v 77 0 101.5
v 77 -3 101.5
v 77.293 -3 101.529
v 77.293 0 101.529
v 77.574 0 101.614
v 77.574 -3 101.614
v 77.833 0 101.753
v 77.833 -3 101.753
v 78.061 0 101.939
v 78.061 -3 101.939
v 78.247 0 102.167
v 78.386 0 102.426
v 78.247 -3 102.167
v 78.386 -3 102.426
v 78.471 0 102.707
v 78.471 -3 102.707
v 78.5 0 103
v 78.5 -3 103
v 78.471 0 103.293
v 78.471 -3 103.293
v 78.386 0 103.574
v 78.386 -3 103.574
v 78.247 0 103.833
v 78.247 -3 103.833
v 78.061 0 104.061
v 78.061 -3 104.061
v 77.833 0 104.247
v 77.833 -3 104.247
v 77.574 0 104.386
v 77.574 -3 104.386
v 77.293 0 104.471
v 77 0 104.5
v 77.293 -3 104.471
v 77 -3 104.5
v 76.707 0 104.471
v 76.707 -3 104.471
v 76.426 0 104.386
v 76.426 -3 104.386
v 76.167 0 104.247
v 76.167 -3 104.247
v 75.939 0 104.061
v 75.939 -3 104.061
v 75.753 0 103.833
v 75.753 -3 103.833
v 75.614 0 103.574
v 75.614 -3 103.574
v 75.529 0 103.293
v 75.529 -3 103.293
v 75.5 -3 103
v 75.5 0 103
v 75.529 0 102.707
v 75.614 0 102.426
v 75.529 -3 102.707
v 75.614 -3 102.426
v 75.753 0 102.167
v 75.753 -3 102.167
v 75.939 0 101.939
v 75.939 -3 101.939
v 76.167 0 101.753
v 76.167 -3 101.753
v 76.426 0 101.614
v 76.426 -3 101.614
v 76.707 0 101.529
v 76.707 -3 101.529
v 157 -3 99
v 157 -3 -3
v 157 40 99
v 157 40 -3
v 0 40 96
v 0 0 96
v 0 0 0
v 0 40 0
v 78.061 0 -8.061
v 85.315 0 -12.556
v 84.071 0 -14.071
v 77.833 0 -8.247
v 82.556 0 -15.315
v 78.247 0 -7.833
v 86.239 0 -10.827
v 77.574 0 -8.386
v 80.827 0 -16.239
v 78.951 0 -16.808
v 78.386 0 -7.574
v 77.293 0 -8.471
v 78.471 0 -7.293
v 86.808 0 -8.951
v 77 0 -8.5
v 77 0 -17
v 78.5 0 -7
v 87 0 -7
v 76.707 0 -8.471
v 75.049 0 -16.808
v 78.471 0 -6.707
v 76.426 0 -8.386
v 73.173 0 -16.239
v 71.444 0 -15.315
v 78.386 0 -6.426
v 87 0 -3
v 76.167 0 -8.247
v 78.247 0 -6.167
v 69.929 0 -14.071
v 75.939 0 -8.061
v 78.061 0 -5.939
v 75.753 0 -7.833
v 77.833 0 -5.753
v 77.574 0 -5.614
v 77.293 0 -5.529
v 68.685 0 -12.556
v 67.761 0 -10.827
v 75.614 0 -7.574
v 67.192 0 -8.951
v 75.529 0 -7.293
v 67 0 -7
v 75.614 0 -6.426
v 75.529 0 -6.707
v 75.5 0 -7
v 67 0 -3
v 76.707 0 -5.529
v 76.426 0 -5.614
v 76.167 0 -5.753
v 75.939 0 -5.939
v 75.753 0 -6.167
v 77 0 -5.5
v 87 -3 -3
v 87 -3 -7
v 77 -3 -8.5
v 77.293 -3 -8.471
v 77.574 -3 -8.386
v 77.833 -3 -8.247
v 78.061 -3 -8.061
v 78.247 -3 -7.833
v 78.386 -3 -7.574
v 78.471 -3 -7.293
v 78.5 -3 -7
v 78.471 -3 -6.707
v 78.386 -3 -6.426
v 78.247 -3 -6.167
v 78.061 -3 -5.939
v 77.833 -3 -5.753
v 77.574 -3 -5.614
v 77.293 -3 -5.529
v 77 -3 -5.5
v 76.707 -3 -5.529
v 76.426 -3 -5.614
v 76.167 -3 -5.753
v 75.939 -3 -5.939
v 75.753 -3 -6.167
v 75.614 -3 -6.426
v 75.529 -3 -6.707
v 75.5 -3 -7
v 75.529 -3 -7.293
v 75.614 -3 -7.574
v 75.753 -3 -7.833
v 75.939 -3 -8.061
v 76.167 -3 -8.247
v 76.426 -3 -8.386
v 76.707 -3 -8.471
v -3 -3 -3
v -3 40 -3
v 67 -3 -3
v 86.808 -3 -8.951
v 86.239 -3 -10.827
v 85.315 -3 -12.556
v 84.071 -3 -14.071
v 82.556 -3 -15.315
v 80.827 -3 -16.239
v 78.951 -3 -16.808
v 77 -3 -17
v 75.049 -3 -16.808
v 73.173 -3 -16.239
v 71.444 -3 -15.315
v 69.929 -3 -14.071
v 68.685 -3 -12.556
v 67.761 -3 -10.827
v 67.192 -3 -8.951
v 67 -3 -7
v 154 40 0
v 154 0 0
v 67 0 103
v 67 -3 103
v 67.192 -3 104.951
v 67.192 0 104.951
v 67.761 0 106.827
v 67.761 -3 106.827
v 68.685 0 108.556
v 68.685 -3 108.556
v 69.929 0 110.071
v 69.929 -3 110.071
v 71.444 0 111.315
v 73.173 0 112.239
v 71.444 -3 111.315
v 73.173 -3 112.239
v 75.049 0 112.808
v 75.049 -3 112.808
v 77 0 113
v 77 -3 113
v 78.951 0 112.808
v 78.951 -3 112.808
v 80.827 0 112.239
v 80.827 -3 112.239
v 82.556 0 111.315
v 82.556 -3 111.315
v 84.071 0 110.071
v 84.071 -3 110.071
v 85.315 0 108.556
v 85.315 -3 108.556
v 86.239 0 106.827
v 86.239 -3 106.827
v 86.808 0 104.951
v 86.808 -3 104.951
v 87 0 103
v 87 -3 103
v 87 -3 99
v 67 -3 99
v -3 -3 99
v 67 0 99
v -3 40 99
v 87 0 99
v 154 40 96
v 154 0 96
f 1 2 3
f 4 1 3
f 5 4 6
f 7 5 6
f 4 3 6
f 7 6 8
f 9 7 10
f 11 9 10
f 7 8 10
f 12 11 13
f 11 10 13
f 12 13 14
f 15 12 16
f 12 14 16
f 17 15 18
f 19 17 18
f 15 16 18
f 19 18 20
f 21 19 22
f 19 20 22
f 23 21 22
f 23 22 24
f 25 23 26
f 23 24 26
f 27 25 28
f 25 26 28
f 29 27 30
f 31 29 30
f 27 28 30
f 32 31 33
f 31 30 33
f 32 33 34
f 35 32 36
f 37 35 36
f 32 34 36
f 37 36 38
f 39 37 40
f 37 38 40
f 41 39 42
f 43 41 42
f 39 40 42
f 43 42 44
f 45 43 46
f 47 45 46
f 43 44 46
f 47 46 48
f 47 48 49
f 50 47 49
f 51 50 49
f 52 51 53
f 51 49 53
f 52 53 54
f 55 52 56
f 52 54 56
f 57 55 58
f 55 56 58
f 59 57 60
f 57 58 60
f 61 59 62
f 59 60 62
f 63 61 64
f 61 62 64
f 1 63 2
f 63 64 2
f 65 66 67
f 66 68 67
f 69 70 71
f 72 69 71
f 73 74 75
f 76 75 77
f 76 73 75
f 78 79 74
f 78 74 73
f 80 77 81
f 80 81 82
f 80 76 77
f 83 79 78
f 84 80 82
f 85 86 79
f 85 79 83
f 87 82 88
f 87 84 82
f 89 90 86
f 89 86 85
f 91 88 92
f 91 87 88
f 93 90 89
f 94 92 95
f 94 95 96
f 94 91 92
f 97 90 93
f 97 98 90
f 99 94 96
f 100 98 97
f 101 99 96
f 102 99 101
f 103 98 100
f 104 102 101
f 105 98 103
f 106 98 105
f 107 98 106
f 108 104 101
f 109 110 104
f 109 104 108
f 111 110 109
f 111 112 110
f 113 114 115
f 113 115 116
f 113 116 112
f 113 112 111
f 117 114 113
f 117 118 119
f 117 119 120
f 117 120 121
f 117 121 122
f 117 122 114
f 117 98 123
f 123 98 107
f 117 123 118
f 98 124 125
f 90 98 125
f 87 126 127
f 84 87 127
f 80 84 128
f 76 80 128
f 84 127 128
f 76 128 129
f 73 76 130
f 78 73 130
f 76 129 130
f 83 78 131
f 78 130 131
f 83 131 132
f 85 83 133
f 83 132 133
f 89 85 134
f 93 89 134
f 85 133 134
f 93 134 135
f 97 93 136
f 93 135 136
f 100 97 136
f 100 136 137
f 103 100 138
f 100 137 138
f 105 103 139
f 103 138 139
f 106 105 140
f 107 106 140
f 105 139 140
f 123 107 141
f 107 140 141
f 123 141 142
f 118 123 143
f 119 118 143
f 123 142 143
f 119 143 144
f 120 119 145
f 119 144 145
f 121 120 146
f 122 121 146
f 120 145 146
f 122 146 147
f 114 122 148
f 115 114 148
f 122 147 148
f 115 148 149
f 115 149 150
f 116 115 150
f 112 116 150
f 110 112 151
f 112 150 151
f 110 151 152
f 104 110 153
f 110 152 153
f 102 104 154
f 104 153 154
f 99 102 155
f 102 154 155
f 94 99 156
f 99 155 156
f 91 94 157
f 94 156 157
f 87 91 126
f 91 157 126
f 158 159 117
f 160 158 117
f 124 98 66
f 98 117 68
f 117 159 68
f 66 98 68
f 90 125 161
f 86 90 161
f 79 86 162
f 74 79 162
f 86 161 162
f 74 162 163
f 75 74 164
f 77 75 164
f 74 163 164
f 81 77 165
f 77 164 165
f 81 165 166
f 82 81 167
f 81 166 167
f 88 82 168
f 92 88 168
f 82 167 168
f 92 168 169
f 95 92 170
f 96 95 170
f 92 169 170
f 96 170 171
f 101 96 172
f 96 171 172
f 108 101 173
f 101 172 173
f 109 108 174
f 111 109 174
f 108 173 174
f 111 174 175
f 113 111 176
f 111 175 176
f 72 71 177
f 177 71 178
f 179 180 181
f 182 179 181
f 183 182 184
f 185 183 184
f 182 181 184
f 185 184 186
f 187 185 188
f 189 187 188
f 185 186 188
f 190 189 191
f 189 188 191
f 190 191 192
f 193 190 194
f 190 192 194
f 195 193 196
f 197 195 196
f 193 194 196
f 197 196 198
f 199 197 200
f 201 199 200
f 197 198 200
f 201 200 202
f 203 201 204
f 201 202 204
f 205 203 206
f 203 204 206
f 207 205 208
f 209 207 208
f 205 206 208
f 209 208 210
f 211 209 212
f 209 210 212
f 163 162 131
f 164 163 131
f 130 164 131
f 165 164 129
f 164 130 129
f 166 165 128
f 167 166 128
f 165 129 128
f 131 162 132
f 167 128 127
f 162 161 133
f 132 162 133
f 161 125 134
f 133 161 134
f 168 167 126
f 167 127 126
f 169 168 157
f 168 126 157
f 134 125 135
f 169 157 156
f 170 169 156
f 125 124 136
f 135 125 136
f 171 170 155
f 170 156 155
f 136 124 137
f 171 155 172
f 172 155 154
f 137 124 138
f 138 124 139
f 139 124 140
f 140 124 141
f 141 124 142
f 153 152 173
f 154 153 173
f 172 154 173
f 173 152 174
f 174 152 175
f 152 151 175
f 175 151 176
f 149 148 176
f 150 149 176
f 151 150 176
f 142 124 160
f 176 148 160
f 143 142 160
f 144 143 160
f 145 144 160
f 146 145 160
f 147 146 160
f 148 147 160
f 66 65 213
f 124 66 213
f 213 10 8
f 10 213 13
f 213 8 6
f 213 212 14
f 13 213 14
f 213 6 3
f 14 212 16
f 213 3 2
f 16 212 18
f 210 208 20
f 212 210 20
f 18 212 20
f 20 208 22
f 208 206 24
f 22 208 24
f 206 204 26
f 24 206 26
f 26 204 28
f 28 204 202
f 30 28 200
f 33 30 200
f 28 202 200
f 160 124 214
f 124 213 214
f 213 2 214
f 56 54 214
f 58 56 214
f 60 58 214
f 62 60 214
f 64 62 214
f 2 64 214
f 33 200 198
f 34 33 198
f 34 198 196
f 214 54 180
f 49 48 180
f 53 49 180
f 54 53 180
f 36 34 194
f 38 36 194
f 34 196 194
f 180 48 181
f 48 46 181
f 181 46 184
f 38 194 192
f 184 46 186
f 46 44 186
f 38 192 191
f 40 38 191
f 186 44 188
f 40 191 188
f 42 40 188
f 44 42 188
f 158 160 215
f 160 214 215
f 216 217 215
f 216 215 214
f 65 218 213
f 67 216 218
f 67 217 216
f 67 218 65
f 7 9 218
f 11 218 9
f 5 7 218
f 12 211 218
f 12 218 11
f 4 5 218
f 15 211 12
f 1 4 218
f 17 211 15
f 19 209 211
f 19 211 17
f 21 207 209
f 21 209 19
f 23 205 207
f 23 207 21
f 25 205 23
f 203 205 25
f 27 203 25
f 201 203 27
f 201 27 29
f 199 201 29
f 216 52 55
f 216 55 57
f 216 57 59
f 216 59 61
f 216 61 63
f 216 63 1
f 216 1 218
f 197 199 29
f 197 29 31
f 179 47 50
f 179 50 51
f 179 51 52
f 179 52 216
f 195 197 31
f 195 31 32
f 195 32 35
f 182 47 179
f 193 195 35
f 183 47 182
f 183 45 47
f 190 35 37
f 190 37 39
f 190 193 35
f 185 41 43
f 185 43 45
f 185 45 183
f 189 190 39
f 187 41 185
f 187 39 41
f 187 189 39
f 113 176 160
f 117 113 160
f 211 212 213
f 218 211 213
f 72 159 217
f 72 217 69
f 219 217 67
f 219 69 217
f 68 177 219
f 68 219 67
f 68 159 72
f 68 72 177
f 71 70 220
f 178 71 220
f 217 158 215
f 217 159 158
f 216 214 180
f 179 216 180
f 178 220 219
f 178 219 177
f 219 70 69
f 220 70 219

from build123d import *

# Parameters (mm, degrees)
SKETCH1_W           = 160
SKETCH1_H           = 102
SKETCH1_W_2         = 154
SKETCH1_H_2         = 96
BOSS_EXTRUDE1_DEPTH = 40
SKETCH2_W           = 160
SKETCH2_H           = 102
BOSS_EXTRUDE2_DEPTH = 3
SKETCH3_R           = 1.5
BOSS_EXTRUDE3_DEPTH = 3


with BuildPart() as part:
    # Sketch1 → Boss-Extrude1 (new body)
    with BuildSketch(Plane(origin=(0, 0, 0), x_dir=(1, 0, 0), z_dir=(0, 1, 0))):
        with Locations((77, -48)):
            Rectangle(SKETCH1_W, SKETCH1_H)
        with Locations((77, -48)):
            Rectangle(SKETCH1_W_2, SKETCH1_H_2, mode=Mode.SUBTRACT)
    extrude(amount=BOSS_EXTRUDE1_DEPTH)

    # Sketch2 → Boss-Extrude2 (add)
    with BuildSketch(Plane.XZ):
        with Locations((77, 48)):
            Rectangle(SKETCH2_W, SKETCH2_H)
    extrude(amount=BOSS_EXTRUDE2_DEPTH)

    # Sketch3 → Boss-Extrude3 (add)
    with BuildSketch(Plane.XZ.offset(3)):
        with BuildLine():
            Line((87, 103), (87, -7))
            ThreePointArc((87, -7), (77, -17), (67, -7))
            Line((67, -7), (67, 103))
            ThreePointArc((67, 103), (77, 113), (87, 103))
        make_face()
        with Locations(Location((77, -7, 0), (0, 0, 270))):
            Circle(SKETCH3_R, mode=Mode.SUBTRACT)
        with Locations(Location((77, 103, 0), (0, 0, 270))):
            Circle(SKETCH3_R, mode=Mode.SUBTRACT)
    extrude(amount=-BOSS_EXTRUDE3_DEPTH)


solid = part.part
